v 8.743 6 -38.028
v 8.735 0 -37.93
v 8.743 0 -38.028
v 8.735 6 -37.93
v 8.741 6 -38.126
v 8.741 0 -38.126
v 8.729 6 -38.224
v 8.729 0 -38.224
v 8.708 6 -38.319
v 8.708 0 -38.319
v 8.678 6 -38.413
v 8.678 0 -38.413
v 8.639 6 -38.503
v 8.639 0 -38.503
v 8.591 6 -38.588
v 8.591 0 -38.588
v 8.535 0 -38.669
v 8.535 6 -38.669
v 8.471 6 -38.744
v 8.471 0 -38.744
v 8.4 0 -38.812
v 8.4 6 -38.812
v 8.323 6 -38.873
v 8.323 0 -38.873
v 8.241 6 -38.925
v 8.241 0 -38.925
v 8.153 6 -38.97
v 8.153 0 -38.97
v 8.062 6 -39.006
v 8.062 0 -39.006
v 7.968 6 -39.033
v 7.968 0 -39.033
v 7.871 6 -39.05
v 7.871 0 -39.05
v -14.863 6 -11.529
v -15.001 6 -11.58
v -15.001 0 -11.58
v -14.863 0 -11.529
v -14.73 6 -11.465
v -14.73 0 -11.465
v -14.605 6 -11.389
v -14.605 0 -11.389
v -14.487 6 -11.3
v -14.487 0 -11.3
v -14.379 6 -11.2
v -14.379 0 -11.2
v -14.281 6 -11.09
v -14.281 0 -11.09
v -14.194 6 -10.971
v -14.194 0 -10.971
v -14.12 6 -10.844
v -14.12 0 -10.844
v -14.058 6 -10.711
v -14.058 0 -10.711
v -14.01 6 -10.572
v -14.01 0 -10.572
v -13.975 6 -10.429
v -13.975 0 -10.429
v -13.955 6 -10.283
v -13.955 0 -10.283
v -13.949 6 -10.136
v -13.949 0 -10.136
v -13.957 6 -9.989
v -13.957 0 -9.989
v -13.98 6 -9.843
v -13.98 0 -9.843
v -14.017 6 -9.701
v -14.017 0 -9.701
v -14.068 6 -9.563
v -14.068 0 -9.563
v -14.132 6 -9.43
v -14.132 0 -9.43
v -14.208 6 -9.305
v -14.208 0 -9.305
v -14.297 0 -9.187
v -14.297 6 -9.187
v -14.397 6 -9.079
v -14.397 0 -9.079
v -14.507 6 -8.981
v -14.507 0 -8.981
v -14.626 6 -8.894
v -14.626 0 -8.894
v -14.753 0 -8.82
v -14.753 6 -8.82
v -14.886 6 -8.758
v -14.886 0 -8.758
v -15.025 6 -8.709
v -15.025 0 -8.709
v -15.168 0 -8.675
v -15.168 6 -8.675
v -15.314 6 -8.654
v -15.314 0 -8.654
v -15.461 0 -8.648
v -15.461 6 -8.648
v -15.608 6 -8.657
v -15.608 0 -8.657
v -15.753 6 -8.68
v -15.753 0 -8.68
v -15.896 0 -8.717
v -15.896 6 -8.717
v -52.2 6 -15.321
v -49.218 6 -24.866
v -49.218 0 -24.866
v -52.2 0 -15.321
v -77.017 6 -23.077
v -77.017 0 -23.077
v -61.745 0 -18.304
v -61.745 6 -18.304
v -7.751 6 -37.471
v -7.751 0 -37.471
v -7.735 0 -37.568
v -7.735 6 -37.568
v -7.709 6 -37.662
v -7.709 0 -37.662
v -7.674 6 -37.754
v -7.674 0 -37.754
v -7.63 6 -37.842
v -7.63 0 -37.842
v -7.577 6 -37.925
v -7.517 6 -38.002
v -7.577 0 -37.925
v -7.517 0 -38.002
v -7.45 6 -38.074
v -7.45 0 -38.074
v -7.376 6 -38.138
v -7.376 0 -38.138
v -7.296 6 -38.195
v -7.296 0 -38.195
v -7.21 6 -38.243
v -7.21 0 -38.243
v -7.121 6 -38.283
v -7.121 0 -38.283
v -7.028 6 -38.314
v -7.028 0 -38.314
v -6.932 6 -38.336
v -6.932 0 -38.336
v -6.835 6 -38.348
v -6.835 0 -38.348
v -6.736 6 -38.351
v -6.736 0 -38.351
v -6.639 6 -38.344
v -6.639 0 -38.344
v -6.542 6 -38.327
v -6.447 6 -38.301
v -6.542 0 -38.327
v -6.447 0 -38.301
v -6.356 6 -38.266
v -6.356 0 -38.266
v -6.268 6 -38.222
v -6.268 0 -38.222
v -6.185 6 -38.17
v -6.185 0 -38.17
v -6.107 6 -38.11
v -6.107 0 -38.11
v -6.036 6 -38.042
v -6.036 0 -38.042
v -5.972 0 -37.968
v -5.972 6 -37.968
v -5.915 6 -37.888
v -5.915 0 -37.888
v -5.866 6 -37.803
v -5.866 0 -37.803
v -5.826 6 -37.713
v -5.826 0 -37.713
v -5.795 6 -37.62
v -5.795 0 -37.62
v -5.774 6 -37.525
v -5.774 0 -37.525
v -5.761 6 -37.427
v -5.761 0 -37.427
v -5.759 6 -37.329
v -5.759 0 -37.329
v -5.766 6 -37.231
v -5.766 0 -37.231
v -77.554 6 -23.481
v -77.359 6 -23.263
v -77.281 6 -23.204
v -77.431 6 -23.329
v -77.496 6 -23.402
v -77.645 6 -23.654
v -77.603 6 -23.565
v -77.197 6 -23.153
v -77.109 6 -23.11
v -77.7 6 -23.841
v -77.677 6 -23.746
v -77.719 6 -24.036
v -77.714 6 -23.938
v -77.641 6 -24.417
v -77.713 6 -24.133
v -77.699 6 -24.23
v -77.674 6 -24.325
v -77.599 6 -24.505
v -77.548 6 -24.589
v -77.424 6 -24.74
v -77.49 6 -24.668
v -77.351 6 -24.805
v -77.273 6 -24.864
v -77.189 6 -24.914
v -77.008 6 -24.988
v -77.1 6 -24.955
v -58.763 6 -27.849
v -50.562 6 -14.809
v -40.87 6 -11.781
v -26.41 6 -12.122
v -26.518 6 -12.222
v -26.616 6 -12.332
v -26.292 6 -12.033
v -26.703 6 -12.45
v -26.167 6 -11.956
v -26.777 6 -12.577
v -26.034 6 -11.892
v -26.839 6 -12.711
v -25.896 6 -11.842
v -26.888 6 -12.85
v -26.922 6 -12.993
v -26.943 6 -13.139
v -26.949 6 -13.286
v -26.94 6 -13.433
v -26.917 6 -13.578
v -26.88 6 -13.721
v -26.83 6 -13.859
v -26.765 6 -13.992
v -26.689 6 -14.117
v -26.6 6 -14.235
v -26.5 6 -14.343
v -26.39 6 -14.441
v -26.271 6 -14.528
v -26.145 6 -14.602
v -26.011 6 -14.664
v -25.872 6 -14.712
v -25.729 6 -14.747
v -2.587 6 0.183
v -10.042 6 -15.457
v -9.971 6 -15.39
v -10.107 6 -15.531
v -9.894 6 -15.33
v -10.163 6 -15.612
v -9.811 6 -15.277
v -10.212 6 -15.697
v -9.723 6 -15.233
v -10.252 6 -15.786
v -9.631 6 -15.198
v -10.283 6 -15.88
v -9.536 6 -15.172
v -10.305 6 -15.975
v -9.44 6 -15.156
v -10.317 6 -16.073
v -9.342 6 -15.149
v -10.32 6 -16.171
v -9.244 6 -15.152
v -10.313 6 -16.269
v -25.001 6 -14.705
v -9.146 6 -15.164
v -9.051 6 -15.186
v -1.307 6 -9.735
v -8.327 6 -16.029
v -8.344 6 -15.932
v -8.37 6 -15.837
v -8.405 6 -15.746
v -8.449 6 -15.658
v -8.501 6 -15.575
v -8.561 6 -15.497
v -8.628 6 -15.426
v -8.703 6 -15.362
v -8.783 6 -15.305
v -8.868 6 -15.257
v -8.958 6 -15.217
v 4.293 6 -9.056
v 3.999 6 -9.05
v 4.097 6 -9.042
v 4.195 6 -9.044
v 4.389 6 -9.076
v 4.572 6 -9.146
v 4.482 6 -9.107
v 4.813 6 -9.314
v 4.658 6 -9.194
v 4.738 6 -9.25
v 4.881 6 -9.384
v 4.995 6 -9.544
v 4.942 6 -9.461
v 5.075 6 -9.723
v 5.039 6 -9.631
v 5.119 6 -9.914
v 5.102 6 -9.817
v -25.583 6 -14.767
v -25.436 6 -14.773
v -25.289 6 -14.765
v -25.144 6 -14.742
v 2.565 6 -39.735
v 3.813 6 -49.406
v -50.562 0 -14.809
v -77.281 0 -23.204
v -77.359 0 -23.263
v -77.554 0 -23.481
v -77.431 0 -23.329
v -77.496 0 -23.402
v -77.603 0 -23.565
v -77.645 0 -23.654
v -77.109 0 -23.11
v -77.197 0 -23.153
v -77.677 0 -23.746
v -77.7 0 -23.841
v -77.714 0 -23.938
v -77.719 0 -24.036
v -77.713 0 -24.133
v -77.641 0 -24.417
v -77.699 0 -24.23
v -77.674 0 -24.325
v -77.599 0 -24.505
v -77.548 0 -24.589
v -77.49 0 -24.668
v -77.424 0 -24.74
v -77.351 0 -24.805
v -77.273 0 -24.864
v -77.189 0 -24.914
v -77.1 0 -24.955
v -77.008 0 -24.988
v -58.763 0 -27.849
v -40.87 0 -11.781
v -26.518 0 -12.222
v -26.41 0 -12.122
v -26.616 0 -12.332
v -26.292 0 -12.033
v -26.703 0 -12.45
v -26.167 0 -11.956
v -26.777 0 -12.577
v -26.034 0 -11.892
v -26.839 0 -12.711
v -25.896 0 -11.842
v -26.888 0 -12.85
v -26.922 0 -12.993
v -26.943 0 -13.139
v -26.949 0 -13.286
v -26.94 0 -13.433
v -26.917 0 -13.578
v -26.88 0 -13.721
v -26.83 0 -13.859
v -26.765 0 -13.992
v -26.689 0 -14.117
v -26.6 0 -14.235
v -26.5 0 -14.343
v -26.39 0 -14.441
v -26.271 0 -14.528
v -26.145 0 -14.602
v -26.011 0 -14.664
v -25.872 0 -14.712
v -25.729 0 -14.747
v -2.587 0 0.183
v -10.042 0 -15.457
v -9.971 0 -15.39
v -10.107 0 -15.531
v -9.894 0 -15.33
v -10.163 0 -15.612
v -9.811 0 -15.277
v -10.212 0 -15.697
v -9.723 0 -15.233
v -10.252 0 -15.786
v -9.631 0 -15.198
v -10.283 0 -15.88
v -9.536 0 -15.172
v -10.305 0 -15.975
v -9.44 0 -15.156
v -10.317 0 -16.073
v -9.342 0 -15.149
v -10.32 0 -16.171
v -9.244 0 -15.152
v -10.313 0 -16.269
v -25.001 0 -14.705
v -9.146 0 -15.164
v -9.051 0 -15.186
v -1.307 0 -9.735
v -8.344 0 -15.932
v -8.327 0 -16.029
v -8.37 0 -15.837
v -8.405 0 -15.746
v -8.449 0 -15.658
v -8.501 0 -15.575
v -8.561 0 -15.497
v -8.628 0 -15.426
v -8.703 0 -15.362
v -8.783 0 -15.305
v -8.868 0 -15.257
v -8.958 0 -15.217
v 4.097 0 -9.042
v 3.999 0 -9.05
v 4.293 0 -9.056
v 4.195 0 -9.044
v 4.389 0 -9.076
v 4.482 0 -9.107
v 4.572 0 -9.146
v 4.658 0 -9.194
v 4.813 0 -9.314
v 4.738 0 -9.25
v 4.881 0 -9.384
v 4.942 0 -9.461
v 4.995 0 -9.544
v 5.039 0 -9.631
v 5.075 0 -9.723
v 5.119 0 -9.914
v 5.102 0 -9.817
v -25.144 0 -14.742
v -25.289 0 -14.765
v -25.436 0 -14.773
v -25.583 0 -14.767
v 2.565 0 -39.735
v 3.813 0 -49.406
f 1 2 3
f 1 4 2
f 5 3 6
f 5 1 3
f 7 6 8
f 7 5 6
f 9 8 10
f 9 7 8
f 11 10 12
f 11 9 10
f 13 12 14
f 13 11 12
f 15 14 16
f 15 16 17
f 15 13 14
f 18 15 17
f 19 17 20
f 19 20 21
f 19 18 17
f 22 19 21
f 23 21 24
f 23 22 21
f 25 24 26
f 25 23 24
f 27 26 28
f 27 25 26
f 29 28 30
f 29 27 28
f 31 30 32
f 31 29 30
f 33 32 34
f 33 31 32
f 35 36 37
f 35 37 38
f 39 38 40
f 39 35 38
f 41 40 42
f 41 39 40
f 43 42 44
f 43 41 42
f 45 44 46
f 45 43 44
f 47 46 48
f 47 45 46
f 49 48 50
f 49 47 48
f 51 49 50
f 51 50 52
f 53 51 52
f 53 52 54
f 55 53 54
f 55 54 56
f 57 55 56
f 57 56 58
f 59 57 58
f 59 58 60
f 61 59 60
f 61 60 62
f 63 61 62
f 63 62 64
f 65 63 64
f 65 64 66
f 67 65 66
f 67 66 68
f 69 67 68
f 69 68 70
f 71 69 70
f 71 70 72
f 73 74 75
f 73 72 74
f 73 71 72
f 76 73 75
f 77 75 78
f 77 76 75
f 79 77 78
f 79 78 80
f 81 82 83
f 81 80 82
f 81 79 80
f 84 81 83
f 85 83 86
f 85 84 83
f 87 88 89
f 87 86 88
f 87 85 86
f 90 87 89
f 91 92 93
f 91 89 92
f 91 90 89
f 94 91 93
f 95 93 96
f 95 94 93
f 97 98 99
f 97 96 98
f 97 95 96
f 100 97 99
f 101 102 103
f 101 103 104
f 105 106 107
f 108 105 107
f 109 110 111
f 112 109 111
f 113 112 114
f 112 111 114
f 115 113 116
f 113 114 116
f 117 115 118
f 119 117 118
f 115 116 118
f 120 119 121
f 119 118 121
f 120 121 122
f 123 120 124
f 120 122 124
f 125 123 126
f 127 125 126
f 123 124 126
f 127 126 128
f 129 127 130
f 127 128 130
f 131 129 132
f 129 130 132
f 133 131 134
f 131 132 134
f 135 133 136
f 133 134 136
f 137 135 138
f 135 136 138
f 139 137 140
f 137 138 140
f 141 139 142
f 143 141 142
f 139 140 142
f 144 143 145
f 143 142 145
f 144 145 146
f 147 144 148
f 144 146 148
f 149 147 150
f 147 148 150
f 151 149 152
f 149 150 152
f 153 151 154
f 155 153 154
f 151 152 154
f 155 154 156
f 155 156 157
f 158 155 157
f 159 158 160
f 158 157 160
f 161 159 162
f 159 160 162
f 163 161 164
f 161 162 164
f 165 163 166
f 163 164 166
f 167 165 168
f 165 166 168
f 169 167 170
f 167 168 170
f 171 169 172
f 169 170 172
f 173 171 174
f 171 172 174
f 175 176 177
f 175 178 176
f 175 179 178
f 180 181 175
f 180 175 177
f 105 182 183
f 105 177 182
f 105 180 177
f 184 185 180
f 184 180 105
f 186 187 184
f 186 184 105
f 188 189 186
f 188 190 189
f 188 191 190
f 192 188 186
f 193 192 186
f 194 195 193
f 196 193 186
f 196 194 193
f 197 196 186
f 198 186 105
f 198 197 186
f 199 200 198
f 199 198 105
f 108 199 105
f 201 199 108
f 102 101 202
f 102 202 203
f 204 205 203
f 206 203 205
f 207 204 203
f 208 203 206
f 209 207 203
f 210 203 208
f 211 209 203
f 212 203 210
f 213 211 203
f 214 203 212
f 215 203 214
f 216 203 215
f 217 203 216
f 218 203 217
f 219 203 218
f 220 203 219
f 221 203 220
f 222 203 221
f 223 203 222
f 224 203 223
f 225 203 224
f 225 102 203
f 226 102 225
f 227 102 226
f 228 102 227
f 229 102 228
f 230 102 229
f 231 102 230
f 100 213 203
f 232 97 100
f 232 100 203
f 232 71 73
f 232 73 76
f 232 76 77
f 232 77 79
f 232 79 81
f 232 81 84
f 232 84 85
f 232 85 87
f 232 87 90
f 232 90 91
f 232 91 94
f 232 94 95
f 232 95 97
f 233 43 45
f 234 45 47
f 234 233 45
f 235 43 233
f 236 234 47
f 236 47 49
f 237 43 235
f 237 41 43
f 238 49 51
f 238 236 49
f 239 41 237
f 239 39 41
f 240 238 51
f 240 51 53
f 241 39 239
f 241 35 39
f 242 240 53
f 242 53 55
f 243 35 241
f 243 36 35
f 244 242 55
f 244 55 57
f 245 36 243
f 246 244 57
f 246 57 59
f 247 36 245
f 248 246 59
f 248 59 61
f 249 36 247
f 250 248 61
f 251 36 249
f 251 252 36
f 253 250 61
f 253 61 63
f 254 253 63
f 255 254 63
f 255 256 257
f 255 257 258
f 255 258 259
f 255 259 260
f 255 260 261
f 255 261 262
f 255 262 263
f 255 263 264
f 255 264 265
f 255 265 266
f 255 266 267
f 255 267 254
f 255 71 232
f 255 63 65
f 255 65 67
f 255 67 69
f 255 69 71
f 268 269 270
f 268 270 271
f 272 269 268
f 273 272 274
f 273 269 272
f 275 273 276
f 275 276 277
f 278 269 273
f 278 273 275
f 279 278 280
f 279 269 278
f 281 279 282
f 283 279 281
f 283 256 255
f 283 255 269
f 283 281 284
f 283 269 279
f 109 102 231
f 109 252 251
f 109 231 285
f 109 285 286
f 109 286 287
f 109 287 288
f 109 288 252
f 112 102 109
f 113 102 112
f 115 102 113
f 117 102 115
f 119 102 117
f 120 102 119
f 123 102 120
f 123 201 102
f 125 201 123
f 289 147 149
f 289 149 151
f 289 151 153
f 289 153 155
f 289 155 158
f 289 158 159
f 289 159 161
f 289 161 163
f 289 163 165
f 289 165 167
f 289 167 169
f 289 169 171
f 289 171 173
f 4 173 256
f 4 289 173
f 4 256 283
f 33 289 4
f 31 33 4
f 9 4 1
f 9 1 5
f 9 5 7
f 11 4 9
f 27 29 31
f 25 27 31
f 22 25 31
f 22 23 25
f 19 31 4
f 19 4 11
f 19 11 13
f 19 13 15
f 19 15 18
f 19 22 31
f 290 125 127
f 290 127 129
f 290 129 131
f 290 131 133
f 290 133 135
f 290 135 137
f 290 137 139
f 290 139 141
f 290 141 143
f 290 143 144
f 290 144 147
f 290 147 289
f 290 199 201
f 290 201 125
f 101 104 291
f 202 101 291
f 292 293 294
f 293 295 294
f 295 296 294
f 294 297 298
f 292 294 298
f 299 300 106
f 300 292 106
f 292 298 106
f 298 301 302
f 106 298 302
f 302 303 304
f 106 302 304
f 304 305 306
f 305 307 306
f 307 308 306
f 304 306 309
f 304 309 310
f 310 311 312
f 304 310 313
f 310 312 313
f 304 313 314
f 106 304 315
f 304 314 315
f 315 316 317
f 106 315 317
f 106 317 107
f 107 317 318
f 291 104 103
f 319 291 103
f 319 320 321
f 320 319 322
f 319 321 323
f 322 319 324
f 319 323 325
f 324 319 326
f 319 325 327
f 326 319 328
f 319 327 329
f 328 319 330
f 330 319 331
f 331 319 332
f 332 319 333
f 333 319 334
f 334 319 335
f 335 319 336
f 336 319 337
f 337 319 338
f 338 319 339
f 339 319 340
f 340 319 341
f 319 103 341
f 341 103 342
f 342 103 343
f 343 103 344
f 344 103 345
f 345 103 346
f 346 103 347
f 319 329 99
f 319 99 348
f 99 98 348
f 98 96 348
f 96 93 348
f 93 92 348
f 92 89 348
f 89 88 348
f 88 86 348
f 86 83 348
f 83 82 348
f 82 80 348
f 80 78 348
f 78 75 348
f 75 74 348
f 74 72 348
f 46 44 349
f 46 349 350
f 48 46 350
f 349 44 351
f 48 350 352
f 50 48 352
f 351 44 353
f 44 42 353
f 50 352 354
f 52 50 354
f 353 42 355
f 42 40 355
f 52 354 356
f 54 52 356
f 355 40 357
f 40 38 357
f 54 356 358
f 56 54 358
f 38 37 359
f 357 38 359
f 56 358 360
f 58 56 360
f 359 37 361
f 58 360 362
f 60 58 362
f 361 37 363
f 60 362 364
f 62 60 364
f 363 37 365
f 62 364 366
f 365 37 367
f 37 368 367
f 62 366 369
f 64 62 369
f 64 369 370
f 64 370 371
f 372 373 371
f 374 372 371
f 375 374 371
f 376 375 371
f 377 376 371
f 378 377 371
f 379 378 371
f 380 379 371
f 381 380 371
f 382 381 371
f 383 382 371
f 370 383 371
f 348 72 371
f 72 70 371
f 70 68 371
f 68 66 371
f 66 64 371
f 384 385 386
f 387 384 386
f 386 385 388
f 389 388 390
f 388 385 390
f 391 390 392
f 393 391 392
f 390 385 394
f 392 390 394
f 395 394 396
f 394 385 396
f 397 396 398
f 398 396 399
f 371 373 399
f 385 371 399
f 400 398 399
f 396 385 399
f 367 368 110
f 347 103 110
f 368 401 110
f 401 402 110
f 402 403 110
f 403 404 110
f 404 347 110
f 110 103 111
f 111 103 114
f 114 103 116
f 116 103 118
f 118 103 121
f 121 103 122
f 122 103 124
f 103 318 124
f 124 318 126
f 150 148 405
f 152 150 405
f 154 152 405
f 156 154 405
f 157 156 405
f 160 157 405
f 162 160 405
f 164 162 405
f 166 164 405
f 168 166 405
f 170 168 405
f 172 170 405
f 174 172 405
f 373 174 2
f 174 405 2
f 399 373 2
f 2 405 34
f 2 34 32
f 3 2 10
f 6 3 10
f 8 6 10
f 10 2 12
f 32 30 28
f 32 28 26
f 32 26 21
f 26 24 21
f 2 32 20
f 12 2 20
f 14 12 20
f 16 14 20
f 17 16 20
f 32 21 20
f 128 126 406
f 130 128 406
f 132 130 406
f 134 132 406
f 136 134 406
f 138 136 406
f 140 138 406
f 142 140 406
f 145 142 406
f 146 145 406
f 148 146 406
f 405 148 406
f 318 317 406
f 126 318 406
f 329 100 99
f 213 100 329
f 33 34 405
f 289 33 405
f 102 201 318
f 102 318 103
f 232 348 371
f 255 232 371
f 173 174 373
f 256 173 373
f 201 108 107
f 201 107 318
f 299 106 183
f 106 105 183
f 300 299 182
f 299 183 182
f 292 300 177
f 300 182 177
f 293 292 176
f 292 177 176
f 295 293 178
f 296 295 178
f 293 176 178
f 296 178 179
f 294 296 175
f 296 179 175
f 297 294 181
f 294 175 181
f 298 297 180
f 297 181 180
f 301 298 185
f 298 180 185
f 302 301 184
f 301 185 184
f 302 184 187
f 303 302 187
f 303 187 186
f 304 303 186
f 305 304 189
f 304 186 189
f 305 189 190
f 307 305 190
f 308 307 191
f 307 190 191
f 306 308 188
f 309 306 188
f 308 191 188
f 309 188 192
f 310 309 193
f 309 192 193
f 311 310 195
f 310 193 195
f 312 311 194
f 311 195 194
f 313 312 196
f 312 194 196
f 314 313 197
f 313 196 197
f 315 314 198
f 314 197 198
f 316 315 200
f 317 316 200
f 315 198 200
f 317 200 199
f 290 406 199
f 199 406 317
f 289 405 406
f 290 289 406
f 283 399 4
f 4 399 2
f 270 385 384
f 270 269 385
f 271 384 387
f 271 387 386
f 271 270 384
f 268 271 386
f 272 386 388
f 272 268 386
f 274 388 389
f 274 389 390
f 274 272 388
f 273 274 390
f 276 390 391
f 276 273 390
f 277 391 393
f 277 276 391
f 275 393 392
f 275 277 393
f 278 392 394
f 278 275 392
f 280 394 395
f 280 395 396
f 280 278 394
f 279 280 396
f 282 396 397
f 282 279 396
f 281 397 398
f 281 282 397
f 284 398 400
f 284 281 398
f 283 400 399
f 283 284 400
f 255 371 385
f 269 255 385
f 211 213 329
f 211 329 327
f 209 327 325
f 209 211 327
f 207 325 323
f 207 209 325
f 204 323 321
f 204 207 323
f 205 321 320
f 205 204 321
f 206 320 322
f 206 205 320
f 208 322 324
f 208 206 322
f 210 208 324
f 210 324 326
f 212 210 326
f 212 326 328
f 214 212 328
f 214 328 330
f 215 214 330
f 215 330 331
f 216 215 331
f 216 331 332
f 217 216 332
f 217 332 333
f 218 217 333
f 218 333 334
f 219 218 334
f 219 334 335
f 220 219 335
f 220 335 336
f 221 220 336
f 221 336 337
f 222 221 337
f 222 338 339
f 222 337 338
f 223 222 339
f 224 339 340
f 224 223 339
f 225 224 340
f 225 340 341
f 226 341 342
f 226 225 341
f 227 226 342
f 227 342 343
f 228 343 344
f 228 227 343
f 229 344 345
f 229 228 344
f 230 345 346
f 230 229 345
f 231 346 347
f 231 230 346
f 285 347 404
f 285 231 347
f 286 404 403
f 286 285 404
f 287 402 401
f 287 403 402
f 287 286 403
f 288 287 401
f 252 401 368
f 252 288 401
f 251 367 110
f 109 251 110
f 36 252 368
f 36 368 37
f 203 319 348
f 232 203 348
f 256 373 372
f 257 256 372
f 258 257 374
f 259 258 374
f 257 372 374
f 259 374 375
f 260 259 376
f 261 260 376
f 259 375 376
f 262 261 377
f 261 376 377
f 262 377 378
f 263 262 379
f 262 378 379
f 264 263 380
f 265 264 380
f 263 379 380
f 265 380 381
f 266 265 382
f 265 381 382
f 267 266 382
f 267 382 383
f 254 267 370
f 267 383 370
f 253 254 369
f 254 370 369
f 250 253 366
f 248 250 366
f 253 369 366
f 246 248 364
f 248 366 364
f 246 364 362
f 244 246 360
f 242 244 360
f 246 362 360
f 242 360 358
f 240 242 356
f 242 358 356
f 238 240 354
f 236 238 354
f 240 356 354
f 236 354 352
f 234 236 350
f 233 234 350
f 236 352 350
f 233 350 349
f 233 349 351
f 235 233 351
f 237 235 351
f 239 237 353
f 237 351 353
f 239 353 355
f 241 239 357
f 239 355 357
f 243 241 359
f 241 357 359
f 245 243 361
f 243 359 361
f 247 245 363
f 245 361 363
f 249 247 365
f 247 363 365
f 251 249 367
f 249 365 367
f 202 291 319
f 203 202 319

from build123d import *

# Parameters (mm, degrees)
BOSS_EXTRUDE1_DEPTH = 6
FILLET1_R           = 1
CUT_EXTRUDE1_DEPTH  = 93.288252623


with BuildPart() as part:
    # Sketch1 → Boss-Extrude1 (new body)
    with BuildSketch(Plane(origin=(0, 0, 0), x_dir=(1, 0, 0), z_dir=(0, 1, 0))):
        Polygon((-2.58662904, -0.182978259), (-1.306630871, 9.734763655), (4.991135245, 8.921964817), (8.862776708, 38.921964817), (2.565209371, 39.734738), (3.813361808, 49.405731314), (-80.122978657, 24.047130996), (-50.562245366, 14.809401842), (-40.870201664, 11.780638185), align=None)
        with BuildLine():
            Line((-5.765677194, 37.231163577), (-8.327046549, 16.028717249))
            ThreePointArc((-8.327046549, 16.028717249), (-9.439761879, 15.155868697), (-10.312610431, 16.268584027))
            Line((-10.312610431, 16.268584027), (-7.751241076, 37.471030354))
            ThreePointArc((-7.751241076, 37.471030354), (-6.638525747, 38.343878906), (-5.765677194, 37.231163577))
        make_face(mode=Mode.SUBTRACT)
    extrude(amount=BOSS_EXTRUDE1_DEPTH)

    # Fillet1
    fillet1_edges = [part.edges().sort_by_distance(p)[0] for p in [
        (-80.122978657, 3, -24.047130996),
        (8.862776708, 3, -38.921964817),
        (4.991135245, 3, -8.921964817),
    ]]
    fillet(fillet1_edges, radius=FILLET1_R)

    # Sketch2 → Cut-Extrude1 (cut, through all)
    with BuildSketch(Plane(origin=(0, 6, 0), x_dir=(1, 0, 0), z_dir=(0, 1, 0))):
        Polygon((-61.745288627, 18.304102861), (-58.762538695, 27.848902642), (-49.217738915, 24.86615271), (-52.200488846, 15.32135293), align=None)
        with BuildLine():
            Line((-25.001158575, 14.705103686), (-15.001158575, 11.580103686))
            ThreePointArc((-15.001158575, 11.580103686), (-14.016851097, 9.70097123), (-15.895983554, 8.716663752))
            Line((-15.895983554, 8.716663752), (-25.895983554, 11.841663752))
            ThreePointArc((-25.895983554, 11.841663752), (-26.880291031, 13.720796209), (-25.001158575, 14.705103686))
        make_face()
    extrude(amount=-CUT_EXTRUDE1_DEPTH, mode=Mode.SUBTRACT)


solid = part.part
